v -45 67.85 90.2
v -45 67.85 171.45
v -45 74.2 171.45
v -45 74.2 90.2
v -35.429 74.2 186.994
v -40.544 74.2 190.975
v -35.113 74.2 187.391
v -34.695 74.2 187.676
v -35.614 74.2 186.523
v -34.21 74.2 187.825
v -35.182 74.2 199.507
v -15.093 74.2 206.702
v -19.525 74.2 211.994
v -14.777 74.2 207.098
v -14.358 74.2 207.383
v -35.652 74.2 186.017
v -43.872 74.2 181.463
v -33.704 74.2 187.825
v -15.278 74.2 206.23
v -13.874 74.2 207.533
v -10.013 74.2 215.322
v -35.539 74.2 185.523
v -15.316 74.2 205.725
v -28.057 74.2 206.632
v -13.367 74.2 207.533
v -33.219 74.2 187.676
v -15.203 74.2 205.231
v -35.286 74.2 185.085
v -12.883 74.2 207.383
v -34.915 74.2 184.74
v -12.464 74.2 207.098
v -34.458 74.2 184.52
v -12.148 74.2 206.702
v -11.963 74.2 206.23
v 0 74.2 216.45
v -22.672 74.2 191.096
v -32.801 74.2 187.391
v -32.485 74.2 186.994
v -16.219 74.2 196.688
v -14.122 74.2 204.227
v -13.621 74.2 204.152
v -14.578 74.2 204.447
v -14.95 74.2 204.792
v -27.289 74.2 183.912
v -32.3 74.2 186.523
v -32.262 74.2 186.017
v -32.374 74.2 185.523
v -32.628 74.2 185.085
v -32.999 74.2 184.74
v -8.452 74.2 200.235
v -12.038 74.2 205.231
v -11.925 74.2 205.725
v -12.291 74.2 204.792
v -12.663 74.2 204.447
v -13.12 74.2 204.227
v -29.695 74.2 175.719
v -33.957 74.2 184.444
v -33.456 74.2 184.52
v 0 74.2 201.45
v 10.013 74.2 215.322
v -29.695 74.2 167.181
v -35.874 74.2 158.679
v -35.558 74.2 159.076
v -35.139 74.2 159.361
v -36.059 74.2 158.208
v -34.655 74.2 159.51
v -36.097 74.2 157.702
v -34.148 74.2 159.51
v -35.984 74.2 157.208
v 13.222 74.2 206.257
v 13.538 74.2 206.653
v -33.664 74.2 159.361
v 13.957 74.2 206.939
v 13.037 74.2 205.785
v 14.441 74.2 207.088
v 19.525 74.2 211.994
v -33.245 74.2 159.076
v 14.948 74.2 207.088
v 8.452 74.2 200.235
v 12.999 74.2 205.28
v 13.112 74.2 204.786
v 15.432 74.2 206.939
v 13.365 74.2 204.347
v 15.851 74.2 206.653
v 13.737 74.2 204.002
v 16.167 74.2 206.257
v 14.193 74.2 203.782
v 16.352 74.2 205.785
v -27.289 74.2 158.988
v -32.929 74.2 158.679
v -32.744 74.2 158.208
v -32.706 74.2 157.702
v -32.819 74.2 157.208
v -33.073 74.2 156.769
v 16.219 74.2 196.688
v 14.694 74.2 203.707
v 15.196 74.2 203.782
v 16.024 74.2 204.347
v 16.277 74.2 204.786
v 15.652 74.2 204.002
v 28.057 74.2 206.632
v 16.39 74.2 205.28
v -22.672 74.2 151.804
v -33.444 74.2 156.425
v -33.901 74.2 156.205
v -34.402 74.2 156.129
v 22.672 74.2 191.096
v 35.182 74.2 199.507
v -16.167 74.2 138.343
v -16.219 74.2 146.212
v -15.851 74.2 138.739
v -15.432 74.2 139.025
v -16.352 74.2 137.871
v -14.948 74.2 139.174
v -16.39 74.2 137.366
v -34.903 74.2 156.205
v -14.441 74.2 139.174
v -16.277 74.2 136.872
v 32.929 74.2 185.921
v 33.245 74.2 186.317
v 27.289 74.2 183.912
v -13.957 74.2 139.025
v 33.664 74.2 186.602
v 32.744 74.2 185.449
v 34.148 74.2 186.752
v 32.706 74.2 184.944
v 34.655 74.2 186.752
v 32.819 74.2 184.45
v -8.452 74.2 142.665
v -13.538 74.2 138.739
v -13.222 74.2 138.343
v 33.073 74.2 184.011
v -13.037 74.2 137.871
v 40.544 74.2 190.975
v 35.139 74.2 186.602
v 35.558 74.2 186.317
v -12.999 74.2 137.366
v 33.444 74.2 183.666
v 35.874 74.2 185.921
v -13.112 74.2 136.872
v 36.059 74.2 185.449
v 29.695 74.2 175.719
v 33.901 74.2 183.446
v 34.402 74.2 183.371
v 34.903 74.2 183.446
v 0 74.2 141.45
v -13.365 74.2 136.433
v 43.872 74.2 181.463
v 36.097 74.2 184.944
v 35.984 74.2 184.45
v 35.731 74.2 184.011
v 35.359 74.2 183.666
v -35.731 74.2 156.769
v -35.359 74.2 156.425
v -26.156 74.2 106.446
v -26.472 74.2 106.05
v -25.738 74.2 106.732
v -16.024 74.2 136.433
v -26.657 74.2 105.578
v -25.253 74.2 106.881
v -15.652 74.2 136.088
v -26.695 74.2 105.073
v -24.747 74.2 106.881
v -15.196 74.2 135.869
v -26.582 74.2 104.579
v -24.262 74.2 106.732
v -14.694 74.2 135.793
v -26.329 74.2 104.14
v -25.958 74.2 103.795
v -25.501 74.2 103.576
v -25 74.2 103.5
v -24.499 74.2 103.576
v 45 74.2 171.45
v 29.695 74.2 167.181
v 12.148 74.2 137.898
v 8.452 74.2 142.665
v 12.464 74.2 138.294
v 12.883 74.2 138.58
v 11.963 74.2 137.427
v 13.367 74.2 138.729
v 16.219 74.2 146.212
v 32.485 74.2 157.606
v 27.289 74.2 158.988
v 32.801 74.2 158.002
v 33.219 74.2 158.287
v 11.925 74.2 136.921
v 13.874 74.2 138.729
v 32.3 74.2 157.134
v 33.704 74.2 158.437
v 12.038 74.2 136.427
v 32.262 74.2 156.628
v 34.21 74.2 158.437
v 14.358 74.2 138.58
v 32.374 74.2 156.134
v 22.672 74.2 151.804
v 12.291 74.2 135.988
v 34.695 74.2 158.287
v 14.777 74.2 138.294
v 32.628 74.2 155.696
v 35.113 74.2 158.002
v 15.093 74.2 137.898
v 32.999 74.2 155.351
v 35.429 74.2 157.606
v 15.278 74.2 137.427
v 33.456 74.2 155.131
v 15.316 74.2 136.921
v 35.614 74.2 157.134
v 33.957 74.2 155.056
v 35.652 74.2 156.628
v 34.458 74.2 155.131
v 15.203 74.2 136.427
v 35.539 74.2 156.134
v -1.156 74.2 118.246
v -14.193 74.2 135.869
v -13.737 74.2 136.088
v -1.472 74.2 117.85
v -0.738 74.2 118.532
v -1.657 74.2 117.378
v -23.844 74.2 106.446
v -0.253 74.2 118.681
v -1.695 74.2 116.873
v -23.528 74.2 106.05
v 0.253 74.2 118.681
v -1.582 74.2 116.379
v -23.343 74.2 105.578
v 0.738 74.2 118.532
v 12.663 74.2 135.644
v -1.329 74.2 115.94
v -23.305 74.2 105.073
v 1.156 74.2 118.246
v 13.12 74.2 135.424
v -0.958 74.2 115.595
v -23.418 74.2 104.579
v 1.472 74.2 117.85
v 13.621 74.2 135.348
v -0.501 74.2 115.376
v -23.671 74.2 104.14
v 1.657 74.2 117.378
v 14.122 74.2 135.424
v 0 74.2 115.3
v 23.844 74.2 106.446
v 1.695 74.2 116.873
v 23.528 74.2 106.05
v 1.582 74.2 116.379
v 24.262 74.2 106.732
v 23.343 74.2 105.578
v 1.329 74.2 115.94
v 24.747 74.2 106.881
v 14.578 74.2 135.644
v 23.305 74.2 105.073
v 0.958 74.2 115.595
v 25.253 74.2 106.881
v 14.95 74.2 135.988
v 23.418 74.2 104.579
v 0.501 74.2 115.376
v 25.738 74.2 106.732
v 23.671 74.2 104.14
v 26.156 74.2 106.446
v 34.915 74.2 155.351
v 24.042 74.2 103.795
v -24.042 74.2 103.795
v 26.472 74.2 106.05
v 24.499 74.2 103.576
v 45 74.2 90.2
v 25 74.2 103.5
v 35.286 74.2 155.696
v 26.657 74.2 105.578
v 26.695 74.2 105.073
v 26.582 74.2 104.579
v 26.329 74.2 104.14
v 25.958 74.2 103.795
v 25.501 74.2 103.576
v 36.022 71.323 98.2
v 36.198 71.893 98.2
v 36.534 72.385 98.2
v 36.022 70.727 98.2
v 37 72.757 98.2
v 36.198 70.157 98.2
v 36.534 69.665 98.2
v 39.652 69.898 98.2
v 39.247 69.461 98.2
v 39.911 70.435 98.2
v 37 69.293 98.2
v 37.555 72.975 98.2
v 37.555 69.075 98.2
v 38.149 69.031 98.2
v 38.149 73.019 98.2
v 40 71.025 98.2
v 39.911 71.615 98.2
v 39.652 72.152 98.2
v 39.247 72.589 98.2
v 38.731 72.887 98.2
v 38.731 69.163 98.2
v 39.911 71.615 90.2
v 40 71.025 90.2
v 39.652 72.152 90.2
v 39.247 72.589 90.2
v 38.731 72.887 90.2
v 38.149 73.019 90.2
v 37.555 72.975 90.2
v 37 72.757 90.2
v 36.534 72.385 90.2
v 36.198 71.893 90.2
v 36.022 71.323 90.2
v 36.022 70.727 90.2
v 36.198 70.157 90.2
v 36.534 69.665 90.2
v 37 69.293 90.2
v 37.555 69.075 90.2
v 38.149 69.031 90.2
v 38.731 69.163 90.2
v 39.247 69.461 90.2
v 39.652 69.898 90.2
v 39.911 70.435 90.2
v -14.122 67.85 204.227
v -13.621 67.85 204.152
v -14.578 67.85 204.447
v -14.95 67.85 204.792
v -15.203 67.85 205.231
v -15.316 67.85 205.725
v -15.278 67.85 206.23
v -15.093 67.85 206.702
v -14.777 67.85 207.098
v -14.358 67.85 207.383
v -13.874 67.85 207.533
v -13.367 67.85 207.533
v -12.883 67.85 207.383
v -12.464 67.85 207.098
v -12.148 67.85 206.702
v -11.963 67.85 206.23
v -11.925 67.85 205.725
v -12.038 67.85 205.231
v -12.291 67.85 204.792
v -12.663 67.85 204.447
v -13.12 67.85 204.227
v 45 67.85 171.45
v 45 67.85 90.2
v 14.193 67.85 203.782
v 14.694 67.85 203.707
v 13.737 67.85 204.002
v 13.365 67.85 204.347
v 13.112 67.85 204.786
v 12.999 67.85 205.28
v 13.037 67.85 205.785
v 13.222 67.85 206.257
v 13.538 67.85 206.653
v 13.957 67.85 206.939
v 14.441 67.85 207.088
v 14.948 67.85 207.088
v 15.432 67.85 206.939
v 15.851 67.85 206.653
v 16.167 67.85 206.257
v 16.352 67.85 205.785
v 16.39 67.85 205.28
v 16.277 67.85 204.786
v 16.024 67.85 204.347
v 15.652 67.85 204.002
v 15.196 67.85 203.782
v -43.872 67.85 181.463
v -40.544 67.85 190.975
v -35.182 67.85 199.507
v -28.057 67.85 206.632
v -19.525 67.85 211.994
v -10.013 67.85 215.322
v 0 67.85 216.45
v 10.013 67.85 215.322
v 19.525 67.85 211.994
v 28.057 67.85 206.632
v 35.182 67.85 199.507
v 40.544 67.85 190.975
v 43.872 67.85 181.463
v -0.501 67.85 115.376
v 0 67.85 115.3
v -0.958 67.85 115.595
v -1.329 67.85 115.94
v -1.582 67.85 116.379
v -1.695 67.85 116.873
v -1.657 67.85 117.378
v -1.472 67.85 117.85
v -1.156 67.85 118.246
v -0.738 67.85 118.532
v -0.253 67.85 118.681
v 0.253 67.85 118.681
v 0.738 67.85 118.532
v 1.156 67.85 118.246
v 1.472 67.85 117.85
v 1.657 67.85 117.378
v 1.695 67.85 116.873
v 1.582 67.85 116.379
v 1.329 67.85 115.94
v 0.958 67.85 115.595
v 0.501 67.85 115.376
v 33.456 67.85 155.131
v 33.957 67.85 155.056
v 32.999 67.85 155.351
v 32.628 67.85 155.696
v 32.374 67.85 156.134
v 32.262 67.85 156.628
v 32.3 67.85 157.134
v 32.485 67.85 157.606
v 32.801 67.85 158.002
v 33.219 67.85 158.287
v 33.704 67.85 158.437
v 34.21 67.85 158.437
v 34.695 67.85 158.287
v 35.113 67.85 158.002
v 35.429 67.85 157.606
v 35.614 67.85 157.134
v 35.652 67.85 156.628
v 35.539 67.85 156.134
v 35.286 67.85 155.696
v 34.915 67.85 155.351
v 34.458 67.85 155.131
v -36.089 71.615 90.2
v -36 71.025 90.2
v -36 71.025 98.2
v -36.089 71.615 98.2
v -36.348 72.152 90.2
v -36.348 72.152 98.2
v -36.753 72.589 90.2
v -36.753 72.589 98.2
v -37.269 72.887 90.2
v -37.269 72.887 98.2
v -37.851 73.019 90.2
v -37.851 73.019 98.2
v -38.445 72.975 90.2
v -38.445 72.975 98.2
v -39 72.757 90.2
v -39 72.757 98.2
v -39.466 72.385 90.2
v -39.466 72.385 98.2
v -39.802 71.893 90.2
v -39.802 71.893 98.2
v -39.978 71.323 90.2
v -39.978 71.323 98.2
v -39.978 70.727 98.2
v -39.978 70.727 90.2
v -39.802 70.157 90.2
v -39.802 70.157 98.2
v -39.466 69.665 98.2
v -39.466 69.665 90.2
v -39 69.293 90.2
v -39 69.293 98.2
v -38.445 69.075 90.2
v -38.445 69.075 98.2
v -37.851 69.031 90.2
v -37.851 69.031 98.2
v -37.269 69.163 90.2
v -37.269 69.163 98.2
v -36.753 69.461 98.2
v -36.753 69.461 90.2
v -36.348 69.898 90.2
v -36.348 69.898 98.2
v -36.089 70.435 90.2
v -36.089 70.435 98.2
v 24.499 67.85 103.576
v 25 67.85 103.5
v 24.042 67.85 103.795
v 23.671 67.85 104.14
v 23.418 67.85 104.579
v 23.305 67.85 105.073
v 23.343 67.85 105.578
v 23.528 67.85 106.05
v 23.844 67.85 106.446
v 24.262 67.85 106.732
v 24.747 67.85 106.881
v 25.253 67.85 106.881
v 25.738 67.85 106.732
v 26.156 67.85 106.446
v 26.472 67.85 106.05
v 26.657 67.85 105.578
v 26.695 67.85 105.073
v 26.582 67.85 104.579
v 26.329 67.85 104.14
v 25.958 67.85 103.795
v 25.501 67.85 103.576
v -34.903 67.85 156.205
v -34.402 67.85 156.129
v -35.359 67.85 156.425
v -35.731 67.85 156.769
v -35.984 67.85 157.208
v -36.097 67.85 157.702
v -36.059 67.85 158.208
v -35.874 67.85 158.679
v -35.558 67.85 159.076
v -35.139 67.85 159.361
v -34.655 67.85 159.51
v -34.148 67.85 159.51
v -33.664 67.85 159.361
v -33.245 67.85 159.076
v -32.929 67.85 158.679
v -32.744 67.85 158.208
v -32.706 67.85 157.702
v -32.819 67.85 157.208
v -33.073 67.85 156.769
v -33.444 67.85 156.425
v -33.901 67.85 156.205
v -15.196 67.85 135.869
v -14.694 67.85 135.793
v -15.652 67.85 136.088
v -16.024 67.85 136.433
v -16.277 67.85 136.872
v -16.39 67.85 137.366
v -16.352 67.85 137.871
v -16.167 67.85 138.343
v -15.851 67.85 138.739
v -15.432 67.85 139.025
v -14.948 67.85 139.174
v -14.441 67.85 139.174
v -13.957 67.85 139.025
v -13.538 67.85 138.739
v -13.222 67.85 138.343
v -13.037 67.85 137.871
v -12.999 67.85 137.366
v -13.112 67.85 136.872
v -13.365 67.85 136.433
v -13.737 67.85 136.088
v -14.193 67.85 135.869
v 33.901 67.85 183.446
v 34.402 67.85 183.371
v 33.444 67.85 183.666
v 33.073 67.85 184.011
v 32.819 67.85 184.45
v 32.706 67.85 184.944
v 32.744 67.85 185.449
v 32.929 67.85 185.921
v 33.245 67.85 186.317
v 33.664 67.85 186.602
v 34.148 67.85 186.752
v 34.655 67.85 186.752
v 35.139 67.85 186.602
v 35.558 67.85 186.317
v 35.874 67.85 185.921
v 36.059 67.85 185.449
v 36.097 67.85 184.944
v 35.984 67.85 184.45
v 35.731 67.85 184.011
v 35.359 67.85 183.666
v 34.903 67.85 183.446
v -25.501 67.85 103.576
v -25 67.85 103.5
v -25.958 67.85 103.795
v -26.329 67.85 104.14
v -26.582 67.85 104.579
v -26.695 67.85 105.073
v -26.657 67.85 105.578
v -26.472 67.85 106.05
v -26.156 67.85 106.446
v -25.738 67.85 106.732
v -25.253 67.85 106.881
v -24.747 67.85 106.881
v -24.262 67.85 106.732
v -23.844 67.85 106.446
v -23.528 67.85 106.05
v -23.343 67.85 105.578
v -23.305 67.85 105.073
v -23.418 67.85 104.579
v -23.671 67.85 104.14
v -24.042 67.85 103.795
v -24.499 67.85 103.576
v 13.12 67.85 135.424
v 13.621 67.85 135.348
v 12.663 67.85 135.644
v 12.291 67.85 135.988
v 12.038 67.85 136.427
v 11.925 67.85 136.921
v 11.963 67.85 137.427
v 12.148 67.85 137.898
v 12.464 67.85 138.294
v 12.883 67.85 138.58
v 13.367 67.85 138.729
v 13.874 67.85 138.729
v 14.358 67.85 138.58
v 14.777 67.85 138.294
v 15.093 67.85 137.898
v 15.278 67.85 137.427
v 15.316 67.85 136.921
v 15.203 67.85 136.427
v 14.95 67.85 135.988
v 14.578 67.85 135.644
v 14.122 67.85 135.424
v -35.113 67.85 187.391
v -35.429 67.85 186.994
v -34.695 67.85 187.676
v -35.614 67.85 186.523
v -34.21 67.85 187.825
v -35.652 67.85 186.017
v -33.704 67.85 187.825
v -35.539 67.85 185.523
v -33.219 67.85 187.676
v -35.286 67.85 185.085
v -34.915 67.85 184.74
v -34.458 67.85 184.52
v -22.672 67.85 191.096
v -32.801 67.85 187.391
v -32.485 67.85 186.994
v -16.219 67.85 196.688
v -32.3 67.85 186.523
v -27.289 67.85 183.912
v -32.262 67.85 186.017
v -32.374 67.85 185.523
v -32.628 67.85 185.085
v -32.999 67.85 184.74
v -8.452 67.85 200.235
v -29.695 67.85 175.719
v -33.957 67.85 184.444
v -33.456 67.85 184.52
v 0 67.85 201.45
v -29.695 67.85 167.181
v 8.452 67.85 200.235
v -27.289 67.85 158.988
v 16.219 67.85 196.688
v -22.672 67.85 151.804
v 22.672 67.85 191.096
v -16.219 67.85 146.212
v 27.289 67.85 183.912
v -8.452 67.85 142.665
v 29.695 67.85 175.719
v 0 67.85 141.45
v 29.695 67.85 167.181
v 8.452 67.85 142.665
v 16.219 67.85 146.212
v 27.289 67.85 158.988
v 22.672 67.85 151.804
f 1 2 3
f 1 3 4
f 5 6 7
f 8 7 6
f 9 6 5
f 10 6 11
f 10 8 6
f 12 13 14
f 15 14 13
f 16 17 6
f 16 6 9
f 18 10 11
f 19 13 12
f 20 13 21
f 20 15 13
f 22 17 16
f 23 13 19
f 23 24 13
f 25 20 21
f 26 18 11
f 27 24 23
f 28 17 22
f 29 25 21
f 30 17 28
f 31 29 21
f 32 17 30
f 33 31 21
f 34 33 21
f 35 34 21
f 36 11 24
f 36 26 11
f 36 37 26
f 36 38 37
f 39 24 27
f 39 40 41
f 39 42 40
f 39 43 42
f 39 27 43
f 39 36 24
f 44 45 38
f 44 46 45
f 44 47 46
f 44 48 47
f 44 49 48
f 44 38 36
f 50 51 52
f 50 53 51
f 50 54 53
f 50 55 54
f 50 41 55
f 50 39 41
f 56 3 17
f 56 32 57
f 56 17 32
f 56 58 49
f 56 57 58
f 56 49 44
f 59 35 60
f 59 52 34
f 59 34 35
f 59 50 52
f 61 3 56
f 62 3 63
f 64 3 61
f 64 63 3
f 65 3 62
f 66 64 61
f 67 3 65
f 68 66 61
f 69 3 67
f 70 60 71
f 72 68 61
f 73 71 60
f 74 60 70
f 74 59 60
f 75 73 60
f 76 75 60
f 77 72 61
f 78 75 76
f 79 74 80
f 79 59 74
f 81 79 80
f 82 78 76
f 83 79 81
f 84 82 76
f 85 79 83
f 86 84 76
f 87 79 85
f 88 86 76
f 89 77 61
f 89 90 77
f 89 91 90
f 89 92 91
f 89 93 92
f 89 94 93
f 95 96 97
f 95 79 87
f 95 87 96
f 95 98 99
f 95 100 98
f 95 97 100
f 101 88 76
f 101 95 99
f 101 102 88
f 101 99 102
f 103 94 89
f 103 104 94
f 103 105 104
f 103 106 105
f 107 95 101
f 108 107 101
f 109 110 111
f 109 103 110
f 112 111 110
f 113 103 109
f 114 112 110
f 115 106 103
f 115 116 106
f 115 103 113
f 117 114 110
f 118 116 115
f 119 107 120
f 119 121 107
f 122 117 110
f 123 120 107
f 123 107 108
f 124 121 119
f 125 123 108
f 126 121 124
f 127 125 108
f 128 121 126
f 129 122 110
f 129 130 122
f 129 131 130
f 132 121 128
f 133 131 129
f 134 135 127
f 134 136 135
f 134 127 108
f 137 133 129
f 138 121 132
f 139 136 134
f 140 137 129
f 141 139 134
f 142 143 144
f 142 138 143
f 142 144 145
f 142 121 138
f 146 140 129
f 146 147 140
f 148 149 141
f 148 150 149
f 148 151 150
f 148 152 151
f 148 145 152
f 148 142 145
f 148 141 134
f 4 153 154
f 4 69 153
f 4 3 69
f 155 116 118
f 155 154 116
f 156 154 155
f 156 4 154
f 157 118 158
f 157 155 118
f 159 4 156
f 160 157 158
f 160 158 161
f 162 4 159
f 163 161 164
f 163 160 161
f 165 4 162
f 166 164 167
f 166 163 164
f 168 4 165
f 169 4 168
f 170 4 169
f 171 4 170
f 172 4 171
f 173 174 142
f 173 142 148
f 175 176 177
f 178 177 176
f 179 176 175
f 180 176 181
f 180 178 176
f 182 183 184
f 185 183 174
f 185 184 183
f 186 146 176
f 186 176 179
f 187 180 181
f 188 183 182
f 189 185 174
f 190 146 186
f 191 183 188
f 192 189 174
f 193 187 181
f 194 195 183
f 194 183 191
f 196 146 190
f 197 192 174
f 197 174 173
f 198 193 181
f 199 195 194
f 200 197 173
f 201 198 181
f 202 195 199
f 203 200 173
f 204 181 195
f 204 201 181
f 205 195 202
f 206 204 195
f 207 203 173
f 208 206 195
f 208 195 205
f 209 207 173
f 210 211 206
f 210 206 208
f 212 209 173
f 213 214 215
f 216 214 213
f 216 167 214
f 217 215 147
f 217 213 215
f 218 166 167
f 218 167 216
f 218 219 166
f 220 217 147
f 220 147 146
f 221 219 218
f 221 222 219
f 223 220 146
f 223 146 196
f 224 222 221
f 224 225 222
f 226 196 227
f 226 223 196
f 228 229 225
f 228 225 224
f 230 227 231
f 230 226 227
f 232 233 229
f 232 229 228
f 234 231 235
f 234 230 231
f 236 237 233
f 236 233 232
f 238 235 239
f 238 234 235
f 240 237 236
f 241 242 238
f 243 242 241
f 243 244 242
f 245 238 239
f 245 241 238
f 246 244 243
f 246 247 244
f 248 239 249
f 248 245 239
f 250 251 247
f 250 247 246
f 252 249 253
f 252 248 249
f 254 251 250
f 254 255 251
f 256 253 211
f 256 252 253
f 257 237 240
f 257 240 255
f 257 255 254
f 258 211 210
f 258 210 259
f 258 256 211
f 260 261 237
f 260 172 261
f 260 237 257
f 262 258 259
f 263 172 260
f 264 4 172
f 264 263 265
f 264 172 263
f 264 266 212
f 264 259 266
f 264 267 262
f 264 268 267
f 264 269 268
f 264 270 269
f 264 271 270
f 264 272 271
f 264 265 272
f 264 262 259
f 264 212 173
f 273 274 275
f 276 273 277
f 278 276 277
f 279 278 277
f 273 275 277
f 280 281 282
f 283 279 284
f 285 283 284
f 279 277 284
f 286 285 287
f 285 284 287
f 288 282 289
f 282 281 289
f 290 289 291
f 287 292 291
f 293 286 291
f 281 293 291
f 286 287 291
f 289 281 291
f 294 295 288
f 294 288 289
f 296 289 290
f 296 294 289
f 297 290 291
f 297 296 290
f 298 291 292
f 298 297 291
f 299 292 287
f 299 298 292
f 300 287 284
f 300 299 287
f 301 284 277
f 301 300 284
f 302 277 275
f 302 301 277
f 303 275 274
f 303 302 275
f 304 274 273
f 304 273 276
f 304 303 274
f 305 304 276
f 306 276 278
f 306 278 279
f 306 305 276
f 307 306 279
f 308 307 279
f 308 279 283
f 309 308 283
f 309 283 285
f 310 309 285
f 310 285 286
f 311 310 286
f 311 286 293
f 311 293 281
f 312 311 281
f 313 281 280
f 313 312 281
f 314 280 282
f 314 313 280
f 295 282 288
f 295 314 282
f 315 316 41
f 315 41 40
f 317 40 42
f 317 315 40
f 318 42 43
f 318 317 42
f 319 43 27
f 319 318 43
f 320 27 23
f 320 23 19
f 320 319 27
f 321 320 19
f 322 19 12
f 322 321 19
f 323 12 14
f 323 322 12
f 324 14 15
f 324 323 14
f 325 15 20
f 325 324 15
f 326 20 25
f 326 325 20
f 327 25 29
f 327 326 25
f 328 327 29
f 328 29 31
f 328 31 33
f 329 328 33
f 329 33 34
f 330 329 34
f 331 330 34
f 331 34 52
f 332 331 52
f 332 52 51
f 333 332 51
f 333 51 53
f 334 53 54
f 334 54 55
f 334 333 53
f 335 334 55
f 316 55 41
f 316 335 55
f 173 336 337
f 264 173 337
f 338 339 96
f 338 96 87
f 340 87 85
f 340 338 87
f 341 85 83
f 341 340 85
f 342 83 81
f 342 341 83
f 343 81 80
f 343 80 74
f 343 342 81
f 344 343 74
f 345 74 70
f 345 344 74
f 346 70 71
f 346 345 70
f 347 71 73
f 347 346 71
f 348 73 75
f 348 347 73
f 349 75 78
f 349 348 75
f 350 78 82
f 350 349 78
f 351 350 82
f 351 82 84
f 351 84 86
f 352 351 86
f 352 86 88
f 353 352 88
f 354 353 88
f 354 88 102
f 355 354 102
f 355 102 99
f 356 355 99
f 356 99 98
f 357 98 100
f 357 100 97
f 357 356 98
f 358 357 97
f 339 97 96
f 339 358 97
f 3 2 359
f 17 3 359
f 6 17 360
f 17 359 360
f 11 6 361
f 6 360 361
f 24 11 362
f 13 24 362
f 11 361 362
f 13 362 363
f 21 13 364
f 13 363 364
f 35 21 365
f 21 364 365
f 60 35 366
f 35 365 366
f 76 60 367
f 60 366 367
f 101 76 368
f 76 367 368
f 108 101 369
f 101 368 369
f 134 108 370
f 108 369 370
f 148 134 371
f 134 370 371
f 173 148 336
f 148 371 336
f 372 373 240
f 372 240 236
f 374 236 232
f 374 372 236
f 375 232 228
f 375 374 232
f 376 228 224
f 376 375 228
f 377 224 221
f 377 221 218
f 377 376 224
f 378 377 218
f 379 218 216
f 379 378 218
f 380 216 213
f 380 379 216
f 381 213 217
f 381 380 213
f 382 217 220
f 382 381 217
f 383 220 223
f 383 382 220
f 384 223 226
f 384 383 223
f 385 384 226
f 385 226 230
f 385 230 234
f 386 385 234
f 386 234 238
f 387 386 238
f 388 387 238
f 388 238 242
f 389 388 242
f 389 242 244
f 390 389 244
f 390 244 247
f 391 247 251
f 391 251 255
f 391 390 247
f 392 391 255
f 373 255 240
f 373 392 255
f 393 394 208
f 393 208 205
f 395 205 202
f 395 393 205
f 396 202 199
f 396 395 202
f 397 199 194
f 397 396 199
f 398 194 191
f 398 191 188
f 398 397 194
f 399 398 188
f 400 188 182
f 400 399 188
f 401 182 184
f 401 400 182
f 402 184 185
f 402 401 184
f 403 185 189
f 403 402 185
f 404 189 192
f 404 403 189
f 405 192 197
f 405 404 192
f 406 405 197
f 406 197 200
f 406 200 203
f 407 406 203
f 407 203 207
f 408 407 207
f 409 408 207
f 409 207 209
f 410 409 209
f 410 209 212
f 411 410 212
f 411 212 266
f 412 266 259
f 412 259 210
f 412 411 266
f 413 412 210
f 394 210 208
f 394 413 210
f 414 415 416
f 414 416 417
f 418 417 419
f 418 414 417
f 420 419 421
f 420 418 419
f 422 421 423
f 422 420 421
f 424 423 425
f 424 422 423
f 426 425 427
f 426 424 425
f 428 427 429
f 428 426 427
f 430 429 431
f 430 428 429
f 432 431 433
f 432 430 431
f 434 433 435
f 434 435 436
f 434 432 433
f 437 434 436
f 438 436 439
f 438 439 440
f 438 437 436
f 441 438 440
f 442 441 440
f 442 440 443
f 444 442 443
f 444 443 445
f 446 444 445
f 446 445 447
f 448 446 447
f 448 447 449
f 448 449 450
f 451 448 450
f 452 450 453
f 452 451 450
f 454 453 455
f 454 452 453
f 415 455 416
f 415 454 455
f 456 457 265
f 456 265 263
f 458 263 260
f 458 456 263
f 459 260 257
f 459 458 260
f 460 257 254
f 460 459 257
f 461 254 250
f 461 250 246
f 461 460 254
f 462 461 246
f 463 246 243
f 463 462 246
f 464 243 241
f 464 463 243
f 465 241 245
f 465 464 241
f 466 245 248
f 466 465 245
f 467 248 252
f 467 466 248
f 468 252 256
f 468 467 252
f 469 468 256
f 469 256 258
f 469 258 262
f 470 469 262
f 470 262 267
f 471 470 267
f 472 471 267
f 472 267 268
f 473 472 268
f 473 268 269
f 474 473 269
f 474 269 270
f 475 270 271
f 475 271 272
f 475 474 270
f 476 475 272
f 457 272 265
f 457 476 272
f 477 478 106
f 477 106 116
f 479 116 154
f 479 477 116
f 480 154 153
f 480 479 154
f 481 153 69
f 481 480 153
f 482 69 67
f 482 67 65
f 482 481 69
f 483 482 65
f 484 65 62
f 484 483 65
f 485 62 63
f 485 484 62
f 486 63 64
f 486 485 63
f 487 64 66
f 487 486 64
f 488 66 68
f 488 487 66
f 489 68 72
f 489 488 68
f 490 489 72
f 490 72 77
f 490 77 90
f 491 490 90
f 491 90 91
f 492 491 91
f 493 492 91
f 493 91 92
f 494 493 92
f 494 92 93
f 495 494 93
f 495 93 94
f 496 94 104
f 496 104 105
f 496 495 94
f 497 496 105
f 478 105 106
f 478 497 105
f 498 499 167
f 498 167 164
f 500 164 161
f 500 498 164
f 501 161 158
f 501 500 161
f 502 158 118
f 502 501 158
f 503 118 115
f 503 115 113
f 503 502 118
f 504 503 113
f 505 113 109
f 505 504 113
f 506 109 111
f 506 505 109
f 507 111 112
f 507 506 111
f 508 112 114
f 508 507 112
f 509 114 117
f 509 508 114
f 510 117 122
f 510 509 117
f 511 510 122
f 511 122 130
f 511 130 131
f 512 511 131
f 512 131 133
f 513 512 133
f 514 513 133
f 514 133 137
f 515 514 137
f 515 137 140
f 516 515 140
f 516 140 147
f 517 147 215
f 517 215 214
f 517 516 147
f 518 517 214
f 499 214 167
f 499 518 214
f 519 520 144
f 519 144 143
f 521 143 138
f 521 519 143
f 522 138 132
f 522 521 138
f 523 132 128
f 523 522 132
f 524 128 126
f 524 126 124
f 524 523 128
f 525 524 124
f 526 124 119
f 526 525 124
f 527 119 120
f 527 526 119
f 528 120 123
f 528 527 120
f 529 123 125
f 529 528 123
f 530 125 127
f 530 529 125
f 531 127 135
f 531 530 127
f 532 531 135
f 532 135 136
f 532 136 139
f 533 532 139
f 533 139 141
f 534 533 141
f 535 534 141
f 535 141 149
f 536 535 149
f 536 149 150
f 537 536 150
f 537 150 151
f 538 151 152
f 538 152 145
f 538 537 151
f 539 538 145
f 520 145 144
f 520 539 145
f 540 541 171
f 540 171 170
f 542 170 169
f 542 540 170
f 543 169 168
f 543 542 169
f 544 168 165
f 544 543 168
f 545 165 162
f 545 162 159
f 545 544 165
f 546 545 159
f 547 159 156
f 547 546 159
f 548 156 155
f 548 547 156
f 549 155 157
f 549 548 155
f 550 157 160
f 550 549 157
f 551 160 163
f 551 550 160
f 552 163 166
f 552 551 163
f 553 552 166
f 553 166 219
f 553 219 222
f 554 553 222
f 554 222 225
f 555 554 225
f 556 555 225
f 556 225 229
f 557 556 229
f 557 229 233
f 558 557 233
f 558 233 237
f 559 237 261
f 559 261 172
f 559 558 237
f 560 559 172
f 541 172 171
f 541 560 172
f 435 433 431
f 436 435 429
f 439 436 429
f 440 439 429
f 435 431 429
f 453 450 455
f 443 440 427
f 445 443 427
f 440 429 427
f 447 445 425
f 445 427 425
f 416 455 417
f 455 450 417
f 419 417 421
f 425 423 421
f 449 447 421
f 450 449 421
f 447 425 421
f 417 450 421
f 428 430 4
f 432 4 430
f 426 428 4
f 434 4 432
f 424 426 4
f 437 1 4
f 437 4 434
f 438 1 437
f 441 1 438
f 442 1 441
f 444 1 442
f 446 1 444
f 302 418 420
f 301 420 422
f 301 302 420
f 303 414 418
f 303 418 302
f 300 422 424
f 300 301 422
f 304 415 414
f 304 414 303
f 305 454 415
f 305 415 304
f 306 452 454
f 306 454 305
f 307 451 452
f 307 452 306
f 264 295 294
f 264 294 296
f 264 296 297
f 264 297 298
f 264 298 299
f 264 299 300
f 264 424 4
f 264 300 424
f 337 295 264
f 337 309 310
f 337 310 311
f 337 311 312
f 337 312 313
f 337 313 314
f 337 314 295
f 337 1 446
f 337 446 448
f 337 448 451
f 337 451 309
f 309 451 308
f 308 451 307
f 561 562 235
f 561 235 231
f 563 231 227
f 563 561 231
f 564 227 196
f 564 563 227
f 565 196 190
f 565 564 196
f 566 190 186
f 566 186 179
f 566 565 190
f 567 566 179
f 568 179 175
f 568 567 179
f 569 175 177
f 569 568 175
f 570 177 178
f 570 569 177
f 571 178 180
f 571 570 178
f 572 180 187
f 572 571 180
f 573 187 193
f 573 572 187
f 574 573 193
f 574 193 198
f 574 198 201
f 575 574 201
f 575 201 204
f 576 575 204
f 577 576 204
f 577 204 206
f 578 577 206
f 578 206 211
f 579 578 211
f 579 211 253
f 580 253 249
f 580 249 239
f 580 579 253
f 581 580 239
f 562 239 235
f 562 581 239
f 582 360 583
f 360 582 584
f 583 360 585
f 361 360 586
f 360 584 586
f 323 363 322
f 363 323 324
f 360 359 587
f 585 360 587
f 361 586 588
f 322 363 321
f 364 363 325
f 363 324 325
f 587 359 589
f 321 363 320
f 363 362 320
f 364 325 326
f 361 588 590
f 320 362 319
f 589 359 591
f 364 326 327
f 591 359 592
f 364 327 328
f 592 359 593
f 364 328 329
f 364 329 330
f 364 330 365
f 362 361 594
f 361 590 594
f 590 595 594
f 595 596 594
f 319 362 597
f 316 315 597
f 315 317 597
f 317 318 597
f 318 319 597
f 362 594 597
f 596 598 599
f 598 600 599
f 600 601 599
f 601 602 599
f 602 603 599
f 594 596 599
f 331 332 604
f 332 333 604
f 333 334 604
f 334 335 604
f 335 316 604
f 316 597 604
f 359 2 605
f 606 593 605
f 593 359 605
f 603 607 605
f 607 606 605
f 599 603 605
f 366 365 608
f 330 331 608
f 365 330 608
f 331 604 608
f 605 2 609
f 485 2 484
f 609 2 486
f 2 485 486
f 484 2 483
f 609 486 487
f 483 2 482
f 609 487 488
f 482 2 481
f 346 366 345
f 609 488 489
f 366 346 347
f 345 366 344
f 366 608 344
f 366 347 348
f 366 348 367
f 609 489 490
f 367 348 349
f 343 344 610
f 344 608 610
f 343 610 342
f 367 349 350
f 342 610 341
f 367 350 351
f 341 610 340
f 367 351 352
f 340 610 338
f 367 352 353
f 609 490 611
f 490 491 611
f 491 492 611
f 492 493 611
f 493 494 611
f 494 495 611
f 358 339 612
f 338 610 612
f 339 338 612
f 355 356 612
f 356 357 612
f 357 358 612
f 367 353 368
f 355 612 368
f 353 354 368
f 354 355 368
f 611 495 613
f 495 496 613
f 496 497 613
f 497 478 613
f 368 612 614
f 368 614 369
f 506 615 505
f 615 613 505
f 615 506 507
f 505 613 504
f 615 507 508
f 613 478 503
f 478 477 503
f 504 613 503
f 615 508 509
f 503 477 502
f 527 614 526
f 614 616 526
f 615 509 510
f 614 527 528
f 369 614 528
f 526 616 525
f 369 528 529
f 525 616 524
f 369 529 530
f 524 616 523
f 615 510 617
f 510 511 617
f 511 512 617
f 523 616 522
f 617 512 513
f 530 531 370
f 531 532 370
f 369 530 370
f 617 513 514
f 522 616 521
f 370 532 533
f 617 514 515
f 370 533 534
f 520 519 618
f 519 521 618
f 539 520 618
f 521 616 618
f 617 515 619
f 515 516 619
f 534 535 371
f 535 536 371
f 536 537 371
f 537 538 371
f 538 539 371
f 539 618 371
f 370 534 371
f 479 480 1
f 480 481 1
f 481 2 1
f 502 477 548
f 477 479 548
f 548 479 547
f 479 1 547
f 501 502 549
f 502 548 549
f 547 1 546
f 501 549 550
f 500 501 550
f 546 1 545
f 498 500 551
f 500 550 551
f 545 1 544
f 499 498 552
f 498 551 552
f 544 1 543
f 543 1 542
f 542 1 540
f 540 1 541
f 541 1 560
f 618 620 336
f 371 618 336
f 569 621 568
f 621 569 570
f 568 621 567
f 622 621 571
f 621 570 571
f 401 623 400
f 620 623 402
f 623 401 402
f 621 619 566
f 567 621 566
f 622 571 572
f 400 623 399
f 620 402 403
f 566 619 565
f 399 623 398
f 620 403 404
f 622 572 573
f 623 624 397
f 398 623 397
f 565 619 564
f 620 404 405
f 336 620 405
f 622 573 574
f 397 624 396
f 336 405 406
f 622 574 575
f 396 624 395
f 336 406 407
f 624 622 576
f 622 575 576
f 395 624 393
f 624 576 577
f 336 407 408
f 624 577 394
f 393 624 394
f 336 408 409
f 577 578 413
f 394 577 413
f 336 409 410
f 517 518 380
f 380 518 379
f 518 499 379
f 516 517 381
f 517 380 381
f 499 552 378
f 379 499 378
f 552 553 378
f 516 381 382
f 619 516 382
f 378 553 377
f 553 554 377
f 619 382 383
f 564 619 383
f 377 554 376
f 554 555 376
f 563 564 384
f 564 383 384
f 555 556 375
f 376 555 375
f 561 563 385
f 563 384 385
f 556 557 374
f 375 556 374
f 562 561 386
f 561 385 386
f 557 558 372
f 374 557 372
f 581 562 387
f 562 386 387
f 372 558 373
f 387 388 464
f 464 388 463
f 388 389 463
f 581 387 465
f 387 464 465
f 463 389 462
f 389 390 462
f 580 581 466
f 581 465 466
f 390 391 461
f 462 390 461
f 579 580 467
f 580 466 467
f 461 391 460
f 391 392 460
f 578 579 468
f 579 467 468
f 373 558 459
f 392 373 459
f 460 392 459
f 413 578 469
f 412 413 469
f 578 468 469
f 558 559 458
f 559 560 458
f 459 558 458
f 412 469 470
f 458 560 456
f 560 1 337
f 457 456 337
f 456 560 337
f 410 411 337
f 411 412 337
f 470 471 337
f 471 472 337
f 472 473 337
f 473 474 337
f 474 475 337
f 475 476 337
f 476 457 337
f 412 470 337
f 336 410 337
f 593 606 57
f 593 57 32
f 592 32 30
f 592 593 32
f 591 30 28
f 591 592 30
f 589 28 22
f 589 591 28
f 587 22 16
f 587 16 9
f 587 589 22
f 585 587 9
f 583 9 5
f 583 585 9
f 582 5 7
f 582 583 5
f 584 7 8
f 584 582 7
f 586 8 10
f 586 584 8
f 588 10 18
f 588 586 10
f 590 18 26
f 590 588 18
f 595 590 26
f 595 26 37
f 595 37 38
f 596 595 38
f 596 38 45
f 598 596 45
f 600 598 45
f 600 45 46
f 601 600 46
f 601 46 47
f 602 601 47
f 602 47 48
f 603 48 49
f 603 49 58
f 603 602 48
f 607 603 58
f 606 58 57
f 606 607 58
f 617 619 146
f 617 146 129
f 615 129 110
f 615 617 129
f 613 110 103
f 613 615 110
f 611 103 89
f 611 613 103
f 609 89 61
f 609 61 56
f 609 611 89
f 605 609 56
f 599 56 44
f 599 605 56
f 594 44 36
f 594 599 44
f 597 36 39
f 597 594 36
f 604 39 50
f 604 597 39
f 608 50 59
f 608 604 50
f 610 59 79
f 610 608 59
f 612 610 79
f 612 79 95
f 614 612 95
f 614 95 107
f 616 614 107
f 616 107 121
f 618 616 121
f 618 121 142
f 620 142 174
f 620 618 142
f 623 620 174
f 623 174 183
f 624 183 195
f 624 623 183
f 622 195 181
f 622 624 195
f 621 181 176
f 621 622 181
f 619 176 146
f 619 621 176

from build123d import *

# Parameters (mm, degrees)
PARED_A_MOTOR_J2_START           = 67.85
CROQUIS1_W                       = 90
CROQUIS1_H                       = 81.25
PARED_A_MOTOR_J2_DEPTH           = 6.35
PARED_A_MOTOR_J2_REDONDEO_START  = 67.85
CROQUIS2_R                       = 45
PARED_A_MOTOR_J2_REDONDEO_DEPTH  = 6.35
ROSCA_M3_ESCUADRAS_START         = 67.85
CROQUIS4_R                       = 1.25
ROSCA_M3_ESCUADRAS_DEPTH         = 6.35
PASADORES_D4_START               = 90.2
CROQUIS5_R                       = 2
PASADORES_D4_DEPTH               = 8
ROSCA_M3_BASES_CINCHO_START      = 67.85
CROQUIS6_R                       = 1.25
ROSCA_M3_BASES_CINCHO_DEPTH      = 6.35
PASO_DRIVER_Y_8XM3_START         = 67.85
CROQUIS7_R                       = 30
CROQUIS7_R_2                     = 1.7
PASO_DRIVER_Y_8XM3_DEPTH         = 6.35
PASO_M3_ESCUADRAS_TUERCA_START   = 67.85
CROQUIS8_R                       = 1.7
PASO_M3_ESCUADRAS_TUERCA_DEPTH   = 6.35
PASO_M3_BASE_CINCHO_TUERCA_START = 67.85
CROQUIS9_R                       = 1.7
PASO_M3_BASE_CINCHO_TUERCA_DEPTH = 6.35


with BuildPart() as part:
    # Croquis1 → Pared_A_motor_J2 (new body)
    with BuildSketch(Plane(origin=(0, 0, 0), x_dir=(1, 0, 0), z_dir=(0, 1, 0)).offset(PARED_A_MOTOR_J2_START)):
        with Locations((0, -130.825)):
            Rectangle(CROQUIS1_W, CROQUIS1_H)
    extrude(amount=PARED_A_MOTOR_J2_DEPTH)

    # Croquis2 → Pared_A_motor_J2_redondeo (add)
    with BuildSketch(Plane(origin=(0, 0, 0), x_dir=(1, 0, 0), z_dir=(0, 1, 0)).offset(PARED_A_MOTOR_J2_REDONDEO_START)):
        with Locations((0, -171.45)):
            Circle(CROQUIS2_R)
    extrude(amount=PARED_A_MOTOR_J2_REDONDEO_DEPTH)

    # Croquis4 → Rosca_M3_escuadras (cut)
    with BuildSketch(Plane(origin=(0, 0, 0), x_dir=(1, 0, 0), z_dir=(0, 1, 0)).offset(ROSCA_M3_ESCUADRAS_START)):
        with Locations(Location((-25, -105.2, 0), (0, 0, 90))):
            Circle(CROQUIS4_R)
        with Locations(Location((25, -105.2, 0), (0, 0, 90))):
            Circle(CROQUIS4_R)
    extrude(amount=ROSCA_M3_ESCUADRAS_DEPTH, mode=Mode.SUBTRACT)

    # Croquis5 → Pasadores_D4 (cut)
    with BuildSketch(Plane.XY.offset(PASADORES_D4_START)):
        with Locations((-38, 71.025)):
            Circle(CROQUIS5_R)
        with Locations((38, 71.025)):
            Circle(CROQUIS5_R)
    extrude(amount=PASADORES_D4_DEPTH, mode=Mode.SUBTRACT)

    # Croquis6 → Rosca_M3_bases_cincho (cut)
    with BuildSketch(Plane(origin=(0, 0, 0), x_dir=(1, 0, 0), z_dir=(0, 1, 0)).offset(ROSCA_M3_BASES_CINCHO_START)):
        with Locations(Location((0, -117, 0), (0, 0, 90))):
            Circle(CROQUIS6_R)
    extrude(amount=ROSCA_M3_BASES_CINCHO_DEPTH, mode=Mode.SUBTRACT)

    # Croquis7 → Paso_driver_y_8xM3 (cut)
    with BuildSketch(Plane(origin=(0, 0, 0), x_dir=(1, 0, 0), z_dir=(0, 1, 0)).offset(PASO_DRIVER_Y_8XM3_START)):
        with Locations(Location((0, -171.45, 0), (0, 0, 90))):
            Circle(CROQUIS7_R)
        with Locations(Location((34.401729978, -185.070608449, 0), (0, 0, 90))):
            Circle(CROQUIS7_R_2)
        with Locations(Location((14.694471953, -205.40692115, 0), (0, 0, 90))):
            Circle(CROQUIS7_R_2)
        with Locations(Location((-13.620608449, -205.851729978, 0), (0, 0, 90))):
            Circle(CROQUIS7_R_2)
        with Locations(Location((-33.95692115, -186.144471953, 0), (0, 0, 90))):
            Circle(CROQUIS7_R_2)
        with Locations(Location((-34.401729978, -157.829391551, 0), (0, 0, 90))):
            Circle(CROQUIS7_R_2)
        with Locations(Location((-14.694471953, -137.49307885, 0), (0, 0, 90))):
            Circle(CROQUIS7_R_2)
        with Locations(Location((13.620608449, -137.048270022, 0), (0, 0, 90))):
            Circle(CROQUIS7_R_2)
        with Locations(Location((33.95692115, -156.755528047, 0), (0, 0, 90))):
            Circle(CROQUIS7_R_2)
    extrude(amount=PASO_DRIVER_Y_8XM3_DEPTH, mode=Mode.SUBTRACT)

    # Croquis8 → Paso_M3_escuadras_tuerca (cut)
    with BuildSketch(Plane(origin=(0, 0, 0), x_dir=(1, 0, 0), z_dir=(0, 1, 0)).offset(PASO_M3_ESCUADRAS_TUERCA_START)):
        with Locations(Location((-25, -105.2, 0), (0, 0, 90))):
            Circle(CROQUIS8_R)
        with Locations(Location((25, -105.2, 0), (0, 0, 90))):
            Circle(CROQUIS8_R)
    extrude(amount=PASO_M3_ESCUADRAS_TUERCA_DEPTH, mode=Mode.SUBTRACT)

    # Croquis9 → Paso_M3_base_cincho_tuerca (cut)
    with BuildSketch(Plane(origin=(0, 0, 0), x_dir=(1, 0, 0), z_dir=(0, 1, 0)).offset(PASO_M3_BASE_CINCHO_TUERCA_START)):
        with Locations(Location((0, -117, 0), (0, 0, 90))):
            Circle(CROQUIS9_R)
    extrude(amount=PASO_M3_BASE_CINCHO_TUERCA_DEPTH, mode=Mode.SUBTRACT)


solid = part.part
